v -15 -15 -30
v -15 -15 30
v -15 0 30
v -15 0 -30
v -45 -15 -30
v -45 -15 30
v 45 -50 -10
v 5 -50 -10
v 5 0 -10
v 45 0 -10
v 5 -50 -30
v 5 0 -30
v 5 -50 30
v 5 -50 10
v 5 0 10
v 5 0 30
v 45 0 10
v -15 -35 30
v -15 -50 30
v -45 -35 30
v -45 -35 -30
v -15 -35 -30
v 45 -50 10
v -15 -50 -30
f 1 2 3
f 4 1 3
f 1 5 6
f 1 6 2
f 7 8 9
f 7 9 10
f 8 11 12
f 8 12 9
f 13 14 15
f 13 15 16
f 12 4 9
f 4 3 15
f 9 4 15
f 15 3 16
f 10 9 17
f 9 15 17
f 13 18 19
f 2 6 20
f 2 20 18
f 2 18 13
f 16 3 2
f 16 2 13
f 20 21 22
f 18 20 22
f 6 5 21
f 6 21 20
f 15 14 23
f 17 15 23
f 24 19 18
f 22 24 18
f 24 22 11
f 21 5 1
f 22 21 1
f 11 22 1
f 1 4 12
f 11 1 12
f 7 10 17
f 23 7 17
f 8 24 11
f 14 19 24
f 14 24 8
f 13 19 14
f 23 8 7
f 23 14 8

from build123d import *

# Parameters (mm, degrees)
F0_W     = 90
F0_H     = 60
F1_DEPTH = 50
F2_W     = 40
F2_H     = 20
F3_DEPTH = 50.001
F4_DEPTH = 50.001
F5_W     = 30
F5_H     = 15
F6_DEPTH = 60.001


with BuildPart() as f1:
    # F0 (on Front) → F1 (new body)
    with BuildSketch(Plane.XZ):
        Rectangle(F0_W, F0_H)
    extrude(amount=F1_DEPTH)

    # F2 (on face) → F3 (cut, through all)
    with BuildSketch(Plane.XZ.offset(50)):
        with Locations((25, 20)):
            Rectangle(F2_W, F2_H)
    extrude(amount=-F3_DEPTH, mode=Mode.SUBTRACT)

    # F2 (on face) → F4 (cut, through all)
    with BuildSketch(Plane.XZ.offset(50)):
        with Locations((25, -20)):
            Rectangle(F2_W, F2_H)
    extrude(amount=-F4_DEPTH, mode=Mode.SUBTRACT)

    # F5 (on face) → F6 (cut, through all)
    with BuildSketch(Plane.XY.offset(30)):
        with Locations((-30, -7.5)):
            Rectangle(F5_W, F5_H)
        with Locations((-30, -42.5)):
            Rectangle(F5_W, F5_H)
    extrude(amount=-F6_DEPTH, mode=Mode.SUBTRACT)


solid = f1.part
